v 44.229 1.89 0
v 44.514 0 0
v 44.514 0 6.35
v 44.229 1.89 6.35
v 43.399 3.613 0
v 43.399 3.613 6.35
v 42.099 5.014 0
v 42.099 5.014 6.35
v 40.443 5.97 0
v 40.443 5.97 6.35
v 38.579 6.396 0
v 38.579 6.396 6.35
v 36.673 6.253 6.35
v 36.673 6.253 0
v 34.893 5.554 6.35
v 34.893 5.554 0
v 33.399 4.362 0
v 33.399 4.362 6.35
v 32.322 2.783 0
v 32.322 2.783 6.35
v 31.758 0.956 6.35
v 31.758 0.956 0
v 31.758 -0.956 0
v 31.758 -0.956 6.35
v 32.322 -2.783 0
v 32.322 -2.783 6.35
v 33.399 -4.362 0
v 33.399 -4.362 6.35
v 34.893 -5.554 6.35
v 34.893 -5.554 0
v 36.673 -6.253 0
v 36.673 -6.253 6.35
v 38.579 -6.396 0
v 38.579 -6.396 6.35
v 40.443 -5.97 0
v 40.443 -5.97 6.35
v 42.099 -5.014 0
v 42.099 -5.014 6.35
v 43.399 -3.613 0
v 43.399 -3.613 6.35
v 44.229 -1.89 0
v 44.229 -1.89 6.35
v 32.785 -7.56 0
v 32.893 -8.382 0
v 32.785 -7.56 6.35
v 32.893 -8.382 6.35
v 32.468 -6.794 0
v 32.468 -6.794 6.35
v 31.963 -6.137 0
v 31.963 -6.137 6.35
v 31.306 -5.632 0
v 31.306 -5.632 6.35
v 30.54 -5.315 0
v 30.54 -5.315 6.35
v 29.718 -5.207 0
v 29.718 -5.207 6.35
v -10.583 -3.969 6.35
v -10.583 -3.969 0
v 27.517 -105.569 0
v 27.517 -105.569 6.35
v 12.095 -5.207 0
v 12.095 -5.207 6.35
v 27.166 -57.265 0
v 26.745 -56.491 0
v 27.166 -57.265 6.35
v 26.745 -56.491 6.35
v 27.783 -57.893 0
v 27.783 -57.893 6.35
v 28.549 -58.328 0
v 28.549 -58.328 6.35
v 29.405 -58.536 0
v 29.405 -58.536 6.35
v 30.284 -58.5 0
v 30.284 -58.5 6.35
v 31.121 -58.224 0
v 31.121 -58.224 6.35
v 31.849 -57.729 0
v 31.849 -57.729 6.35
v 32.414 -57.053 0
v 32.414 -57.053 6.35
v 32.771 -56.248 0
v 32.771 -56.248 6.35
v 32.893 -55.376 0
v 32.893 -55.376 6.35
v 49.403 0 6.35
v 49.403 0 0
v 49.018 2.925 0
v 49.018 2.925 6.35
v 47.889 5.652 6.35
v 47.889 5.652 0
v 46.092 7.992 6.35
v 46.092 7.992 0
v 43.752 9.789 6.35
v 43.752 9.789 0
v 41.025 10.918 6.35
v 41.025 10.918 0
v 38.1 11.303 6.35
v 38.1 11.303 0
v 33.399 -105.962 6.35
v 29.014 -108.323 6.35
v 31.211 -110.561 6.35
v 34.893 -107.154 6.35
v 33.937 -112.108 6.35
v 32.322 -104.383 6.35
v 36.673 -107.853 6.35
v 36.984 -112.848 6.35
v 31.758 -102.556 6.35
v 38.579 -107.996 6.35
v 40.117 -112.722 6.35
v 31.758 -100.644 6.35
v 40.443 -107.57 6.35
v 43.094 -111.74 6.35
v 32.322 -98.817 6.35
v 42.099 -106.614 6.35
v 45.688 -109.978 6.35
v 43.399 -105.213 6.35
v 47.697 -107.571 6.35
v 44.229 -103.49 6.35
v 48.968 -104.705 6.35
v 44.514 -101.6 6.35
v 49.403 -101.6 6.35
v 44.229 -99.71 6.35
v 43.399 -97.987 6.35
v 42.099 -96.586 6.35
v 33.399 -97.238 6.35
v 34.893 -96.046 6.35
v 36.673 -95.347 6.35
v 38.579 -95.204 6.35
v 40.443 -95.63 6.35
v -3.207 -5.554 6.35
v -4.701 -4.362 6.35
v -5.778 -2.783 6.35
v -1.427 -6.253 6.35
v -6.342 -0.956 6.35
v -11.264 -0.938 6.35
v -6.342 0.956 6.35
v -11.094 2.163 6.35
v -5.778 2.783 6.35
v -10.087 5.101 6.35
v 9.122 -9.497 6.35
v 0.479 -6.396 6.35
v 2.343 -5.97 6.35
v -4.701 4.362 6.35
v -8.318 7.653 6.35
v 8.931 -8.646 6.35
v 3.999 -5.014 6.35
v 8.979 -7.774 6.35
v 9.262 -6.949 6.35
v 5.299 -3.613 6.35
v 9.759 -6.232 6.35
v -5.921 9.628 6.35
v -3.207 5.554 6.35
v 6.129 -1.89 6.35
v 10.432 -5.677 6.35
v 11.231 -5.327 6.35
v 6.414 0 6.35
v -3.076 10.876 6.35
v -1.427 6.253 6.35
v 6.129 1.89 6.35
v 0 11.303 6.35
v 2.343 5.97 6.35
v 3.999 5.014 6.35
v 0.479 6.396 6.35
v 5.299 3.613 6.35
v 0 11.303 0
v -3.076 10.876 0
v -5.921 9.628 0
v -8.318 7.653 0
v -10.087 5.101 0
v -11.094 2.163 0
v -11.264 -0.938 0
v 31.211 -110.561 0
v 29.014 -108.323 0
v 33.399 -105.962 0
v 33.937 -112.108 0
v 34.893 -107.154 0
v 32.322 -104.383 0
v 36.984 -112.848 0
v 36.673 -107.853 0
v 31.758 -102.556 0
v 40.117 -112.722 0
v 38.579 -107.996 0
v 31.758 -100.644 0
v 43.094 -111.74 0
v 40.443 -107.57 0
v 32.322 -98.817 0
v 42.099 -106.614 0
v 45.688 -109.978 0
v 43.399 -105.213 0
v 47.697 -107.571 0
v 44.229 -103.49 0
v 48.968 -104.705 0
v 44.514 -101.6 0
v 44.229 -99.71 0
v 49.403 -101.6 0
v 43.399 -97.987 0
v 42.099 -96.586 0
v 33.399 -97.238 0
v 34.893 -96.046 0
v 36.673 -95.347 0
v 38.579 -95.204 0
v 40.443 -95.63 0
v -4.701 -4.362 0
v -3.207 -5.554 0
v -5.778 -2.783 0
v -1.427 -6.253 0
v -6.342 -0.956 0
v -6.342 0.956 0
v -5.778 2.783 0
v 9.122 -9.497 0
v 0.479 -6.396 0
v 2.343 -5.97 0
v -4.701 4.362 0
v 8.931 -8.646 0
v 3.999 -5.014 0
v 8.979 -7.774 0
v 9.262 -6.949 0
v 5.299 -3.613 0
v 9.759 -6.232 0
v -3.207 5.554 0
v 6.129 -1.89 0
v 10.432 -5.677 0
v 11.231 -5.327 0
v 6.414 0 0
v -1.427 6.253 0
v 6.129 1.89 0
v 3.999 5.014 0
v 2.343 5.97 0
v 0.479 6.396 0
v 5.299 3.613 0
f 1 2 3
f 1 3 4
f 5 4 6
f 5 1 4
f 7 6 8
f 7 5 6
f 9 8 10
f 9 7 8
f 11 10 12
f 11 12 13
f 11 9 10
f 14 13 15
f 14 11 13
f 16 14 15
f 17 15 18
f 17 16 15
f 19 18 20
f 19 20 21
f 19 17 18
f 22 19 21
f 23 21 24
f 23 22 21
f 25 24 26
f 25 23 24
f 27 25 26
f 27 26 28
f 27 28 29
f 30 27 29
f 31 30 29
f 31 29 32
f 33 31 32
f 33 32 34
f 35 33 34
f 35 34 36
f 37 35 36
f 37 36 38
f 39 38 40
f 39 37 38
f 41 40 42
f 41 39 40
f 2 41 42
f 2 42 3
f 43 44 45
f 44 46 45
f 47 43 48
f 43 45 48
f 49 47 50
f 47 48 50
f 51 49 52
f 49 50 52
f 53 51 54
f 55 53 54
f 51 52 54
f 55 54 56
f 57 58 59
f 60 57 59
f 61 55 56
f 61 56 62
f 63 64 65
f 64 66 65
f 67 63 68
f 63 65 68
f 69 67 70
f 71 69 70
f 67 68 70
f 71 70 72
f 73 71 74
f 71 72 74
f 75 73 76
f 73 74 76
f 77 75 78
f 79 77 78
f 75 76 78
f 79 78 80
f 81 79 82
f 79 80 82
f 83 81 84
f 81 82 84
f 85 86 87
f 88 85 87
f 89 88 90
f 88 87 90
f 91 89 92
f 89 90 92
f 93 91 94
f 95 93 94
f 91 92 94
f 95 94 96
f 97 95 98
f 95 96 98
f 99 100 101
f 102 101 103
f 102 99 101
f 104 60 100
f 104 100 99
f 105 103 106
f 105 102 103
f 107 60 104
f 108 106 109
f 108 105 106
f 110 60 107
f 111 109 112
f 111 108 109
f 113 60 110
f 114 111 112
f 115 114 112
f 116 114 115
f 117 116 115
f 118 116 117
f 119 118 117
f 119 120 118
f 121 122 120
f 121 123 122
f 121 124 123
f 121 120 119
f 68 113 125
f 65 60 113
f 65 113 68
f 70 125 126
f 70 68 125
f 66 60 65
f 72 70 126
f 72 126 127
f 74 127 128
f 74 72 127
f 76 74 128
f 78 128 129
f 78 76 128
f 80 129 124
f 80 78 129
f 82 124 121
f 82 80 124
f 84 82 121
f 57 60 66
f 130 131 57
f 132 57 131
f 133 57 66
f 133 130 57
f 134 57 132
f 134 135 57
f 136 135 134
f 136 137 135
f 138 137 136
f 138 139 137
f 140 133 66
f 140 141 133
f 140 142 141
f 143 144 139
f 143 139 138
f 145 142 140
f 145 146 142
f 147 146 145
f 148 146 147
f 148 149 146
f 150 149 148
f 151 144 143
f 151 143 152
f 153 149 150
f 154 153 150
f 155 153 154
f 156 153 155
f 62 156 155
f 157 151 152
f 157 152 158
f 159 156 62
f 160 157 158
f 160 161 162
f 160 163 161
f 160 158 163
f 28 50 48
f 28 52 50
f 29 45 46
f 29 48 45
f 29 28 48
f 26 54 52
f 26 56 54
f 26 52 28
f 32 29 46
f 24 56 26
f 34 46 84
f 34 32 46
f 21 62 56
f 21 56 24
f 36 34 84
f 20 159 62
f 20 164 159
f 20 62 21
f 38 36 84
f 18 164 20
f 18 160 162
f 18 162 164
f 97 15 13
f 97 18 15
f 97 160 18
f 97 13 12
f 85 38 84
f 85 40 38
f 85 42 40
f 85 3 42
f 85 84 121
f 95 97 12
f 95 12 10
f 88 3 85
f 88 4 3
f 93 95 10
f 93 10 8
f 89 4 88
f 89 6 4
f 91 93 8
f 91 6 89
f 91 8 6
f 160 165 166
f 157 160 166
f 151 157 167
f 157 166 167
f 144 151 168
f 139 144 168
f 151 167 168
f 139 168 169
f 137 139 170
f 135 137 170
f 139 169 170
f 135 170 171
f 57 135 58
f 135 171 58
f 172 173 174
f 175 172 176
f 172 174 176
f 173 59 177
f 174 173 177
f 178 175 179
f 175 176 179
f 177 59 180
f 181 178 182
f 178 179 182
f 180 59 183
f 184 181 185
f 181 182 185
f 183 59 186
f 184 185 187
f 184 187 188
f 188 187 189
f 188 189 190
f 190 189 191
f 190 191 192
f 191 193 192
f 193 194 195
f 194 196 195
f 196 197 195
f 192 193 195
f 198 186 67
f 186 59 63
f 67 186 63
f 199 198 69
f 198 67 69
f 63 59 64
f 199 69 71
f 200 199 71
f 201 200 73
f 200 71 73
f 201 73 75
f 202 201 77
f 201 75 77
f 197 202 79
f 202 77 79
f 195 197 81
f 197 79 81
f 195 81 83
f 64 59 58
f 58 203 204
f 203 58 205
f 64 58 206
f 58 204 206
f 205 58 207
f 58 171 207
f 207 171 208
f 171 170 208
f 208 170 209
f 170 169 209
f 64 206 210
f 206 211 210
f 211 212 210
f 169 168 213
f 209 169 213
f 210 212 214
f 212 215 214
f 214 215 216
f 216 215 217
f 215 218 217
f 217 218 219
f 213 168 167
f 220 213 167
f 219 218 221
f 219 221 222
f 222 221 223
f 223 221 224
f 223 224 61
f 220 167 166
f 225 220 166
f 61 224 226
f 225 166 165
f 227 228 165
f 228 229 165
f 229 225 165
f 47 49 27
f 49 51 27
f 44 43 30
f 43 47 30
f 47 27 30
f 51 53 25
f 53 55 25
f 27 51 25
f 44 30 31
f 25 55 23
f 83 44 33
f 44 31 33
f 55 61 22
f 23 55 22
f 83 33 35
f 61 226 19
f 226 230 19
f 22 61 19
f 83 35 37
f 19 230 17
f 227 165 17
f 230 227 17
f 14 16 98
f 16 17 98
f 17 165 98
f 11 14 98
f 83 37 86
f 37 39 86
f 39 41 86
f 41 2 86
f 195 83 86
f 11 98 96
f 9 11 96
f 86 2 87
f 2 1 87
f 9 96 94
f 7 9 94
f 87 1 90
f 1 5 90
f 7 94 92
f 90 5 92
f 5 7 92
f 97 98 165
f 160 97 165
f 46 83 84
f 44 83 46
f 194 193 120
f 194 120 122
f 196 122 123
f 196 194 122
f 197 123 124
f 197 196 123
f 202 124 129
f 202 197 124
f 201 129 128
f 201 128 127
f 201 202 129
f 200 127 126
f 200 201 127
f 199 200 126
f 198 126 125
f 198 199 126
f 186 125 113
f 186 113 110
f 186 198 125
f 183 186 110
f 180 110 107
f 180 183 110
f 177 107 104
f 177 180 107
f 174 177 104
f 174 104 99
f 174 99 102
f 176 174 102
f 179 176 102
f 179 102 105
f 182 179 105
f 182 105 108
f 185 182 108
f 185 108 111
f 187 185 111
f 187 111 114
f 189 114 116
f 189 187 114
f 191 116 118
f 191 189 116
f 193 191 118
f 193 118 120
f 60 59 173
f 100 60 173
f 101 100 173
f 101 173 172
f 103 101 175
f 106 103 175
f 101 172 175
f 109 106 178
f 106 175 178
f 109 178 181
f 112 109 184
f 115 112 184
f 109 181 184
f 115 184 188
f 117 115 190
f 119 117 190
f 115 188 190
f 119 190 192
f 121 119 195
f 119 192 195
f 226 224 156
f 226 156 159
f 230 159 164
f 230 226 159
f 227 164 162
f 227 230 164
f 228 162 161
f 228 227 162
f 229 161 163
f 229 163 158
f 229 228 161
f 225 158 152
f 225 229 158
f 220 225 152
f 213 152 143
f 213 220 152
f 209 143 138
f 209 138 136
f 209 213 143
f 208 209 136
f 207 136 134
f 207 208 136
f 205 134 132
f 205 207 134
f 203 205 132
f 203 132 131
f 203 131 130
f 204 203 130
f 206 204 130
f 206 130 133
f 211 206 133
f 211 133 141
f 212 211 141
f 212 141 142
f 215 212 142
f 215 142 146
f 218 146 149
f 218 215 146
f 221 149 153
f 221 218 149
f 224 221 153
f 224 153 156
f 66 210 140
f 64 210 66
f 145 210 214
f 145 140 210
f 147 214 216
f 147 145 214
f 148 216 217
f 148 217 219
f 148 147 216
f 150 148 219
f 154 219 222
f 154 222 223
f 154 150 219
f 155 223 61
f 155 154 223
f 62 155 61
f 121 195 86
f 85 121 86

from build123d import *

# Parameters (mm, degrees)
ESQUISSE1_R        = 6.4135
BOSS_EXTRU_1_DEPTH = 6.35
CONG_1_R           = 3.175


with BuildPart() as part:
    # Esquisse1 → Boss.-Extru.1 (new body)
    with BuildSketch(Plane.XY):
        with BuildLine():
            Line((-10.583328694, -3.96874826), (27.516671306, -105.56874826))
            ThreePointArc((27.516671306, -105.56874826), (40.116735576, -112.721626977), (49.403, -101.6))
            Line((49.403, -101.6), (49.403, 0))
            ThreePointArc((49.403, 0), (46.092427948, 7.992427948), (38.1, 11.303))
            Line((38.1, 11.303), (0, 11.303))
            ThreePointArc((0, 11.303), (-9.290225255, 6.438130451), (-10.583328694, -3.96874826))
        make_face()
        Circle(ESQUISSE1_R, mode=Mode.SUBTRACT)
        with Locations((38.1, 0)):
            Circle(ESQUISSE1_R, mode=Mode.SUBTRACT)
        with Locations((38.1, -101.6)):
            Circle(ESQUISSE1_R, mode=Mode.SUBTRACT)
        Polygon((7.513703438, -5.207), (32.893, -72.885124166), (32.893, -5.207), align=None, mode=Mode.SUBTRACT)
    extrude(amount=BOSS_EXTRU_1_DEPTH)

    # Congé1
    cong_1_edges = [part.edges().sort_by_distance(p)[0] for p in [
        (32.893, -5.207, 3.175),
        (7.513703438, -5.207, 3.175),
        (32.893, -72.885124166, 3.175),
    ]]
    fillet(cong_1_edges, radius=CONG_1_R)


solid = part.part
